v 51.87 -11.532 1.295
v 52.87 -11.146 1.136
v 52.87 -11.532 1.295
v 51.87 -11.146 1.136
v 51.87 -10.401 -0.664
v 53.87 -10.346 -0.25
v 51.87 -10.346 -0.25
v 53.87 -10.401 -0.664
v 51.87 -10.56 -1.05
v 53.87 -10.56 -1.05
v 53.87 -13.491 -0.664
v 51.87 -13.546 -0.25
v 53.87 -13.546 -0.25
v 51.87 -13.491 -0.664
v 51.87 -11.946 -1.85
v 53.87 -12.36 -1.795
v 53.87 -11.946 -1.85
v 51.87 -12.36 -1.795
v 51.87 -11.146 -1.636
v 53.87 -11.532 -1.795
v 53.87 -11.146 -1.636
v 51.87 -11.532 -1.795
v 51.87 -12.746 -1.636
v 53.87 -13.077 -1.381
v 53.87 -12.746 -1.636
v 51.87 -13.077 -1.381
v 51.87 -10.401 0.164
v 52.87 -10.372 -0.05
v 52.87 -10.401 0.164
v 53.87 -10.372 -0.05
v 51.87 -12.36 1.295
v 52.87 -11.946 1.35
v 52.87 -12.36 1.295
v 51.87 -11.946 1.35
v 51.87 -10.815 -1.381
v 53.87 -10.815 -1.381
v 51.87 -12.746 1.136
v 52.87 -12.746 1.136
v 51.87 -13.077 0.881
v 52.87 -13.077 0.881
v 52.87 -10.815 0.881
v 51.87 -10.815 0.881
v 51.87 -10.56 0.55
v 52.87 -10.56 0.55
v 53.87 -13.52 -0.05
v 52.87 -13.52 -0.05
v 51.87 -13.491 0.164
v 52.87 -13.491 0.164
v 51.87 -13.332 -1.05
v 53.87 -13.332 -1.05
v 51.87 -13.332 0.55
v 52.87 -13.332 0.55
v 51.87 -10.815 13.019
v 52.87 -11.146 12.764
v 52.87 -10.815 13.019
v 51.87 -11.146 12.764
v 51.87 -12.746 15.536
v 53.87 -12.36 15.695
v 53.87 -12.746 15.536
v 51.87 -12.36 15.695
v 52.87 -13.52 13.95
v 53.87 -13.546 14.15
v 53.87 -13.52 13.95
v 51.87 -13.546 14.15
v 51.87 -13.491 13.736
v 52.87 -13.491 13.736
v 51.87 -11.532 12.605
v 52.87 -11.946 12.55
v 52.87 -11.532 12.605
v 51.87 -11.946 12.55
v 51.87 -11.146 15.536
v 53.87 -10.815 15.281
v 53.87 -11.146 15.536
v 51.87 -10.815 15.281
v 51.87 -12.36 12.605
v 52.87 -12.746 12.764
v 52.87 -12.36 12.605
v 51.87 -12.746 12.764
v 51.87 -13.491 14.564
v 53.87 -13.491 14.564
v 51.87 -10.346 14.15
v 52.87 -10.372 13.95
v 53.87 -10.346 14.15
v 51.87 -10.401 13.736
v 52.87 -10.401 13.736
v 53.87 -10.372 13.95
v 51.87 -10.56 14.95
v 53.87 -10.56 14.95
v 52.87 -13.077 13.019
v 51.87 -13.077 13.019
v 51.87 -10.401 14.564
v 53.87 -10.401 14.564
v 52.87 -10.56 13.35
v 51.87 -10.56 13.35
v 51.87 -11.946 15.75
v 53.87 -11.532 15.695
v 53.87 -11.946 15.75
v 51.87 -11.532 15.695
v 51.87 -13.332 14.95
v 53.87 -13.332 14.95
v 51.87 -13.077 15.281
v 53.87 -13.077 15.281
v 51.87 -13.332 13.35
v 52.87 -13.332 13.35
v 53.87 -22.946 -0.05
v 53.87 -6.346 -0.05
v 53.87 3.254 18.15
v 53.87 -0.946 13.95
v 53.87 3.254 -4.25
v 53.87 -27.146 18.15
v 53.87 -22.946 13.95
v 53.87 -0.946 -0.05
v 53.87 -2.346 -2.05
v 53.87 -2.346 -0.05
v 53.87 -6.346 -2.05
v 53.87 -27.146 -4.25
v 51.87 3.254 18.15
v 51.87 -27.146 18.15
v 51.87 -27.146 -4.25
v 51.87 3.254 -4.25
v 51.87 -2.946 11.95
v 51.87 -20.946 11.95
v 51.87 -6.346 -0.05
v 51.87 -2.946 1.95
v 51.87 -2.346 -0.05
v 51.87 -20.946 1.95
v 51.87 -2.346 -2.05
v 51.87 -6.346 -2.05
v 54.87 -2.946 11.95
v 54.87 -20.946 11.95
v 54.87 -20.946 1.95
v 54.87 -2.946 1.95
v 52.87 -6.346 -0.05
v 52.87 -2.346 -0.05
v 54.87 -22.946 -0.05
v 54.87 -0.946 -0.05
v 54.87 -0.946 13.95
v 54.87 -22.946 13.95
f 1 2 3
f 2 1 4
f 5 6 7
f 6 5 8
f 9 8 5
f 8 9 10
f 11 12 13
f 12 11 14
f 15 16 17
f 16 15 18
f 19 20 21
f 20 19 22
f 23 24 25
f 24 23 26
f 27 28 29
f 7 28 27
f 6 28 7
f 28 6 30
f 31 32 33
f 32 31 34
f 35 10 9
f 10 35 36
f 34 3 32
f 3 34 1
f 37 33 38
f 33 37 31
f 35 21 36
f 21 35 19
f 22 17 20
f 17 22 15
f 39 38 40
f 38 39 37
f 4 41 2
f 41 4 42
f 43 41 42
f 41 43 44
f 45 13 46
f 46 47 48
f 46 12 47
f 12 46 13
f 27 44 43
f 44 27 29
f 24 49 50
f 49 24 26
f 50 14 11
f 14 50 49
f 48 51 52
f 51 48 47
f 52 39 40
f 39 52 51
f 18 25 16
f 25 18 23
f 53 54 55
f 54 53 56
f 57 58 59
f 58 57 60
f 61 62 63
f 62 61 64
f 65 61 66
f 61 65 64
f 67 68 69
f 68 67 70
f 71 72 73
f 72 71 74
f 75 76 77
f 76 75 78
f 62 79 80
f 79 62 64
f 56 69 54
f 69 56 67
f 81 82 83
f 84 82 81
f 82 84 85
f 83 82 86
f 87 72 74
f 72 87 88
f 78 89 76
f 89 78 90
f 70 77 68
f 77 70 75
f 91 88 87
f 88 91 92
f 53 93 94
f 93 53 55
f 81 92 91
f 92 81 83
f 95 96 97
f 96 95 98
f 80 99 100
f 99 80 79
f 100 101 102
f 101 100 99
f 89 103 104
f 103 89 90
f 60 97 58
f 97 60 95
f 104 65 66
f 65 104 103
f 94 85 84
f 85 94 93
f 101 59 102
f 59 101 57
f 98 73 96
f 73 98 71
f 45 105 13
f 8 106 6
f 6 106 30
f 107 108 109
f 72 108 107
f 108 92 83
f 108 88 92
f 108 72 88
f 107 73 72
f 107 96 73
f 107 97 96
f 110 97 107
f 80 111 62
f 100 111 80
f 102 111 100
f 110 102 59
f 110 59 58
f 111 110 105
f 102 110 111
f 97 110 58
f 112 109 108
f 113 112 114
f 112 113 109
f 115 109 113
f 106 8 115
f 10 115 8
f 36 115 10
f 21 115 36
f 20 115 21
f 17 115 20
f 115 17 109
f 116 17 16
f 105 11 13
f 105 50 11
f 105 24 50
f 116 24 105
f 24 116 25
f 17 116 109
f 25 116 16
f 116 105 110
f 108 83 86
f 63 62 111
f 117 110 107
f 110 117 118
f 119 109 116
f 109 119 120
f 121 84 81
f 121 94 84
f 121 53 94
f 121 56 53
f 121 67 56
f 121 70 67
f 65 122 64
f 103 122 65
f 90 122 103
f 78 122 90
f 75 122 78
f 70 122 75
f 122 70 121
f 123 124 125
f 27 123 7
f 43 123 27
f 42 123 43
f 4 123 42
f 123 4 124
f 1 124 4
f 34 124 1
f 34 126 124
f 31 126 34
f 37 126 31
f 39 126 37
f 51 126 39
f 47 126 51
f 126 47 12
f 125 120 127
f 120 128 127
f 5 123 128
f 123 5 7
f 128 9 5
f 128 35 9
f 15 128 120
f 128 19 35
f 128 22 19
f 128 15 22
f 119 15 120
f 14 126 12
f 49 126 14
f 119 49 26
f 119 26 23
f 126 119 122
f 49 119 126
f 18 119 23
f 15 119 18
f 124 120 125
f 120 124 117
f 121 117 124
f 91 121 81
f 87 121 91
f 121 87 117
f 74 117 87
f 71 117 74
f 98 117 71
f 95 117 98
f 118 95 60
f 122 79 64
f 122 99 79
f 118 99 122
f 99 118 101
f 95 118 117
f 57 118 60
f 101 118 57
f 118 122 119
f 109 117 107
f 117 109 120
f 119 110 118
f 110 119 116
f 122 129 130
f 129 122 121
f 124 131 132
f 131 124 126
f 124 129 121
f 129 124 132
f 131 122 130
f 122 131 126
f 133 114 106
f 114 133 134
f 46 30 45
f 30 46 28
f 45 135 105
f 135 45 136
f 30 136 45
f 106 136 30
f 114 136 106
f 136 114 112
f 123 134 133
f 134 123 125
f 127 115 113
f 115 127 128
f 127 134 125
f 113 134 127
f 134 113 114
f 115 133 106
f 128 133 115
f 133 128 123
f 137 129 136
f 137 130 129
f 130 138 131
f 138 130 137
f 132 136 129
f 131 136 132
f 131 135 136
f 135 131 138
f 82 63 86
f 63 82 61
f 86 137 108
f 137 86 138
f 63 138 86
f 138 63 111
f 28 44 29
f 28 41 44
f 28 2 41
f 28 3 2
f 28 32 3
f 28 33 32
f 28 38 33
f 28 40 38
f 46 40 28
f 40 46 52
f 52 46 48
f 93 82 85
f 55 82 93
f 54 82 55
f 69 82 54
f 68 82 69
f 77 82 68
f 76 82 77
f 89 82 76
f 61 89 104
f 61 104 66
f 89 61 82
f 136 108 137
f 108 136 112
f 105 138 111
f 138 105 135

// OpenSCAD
// terminal_bracket.scad — Internal terminal mounting bracket (new part)
//
// Designed from scratch. Mounts behind the terminal wall cutout to
// hold the Euroblock receptacle in place with strain relief.
//
// Features:
// - 2 mm thick mounting plate
// - Two M3 through-holes for heat-set inserts
// - 2 mm internal dust lip around cutout perimeter
// - Zip-tie slot for harness strain relief

include <config.scad>

// Bracket dimensions derived from terminal cutout
bracket_width  = terminal_cutout_w + 2 * bracket_dust_lip + 8.0;  // total width with mounting ears
bracket_height = terminal_cutout_h + 2 * bracket_dust_lip + 8.0;  // total height with mounting ears

// Terminal opening in bracket (matches Euroblock receptacle)
bracket_opening_w = 18.0;  // Euroblock receptacle width
bracket_opening_h = 10.0;  // Euroblock receptacle height

module bracket_plate() {
    // Main mounting plate
    difference() {
        // Plate body
        cube([bracket_thickness, bracket_width, bracket_height], center=true);

        // Terminal opening
        cube([bracket_thickness + 1, bracket_opening_w, bracket_opening_h], center=true);

        // M3 mounting holes (one above, one below the terminal)
        for (dz = [-bracket_height / 2 + 4, bracket_height / 2 - 4]) {
            translate([0, 0, dz])
                rotate([0, 90, 0])
                    cylinder(d=bracket_m3_hole_d, h=bracket_thickness + 1, center=true, $fn=24);
        }

        // Zip-tie slot (below the terminal opening, offset to one side)
        translate([0, bracket_width / 4, -bracket_opening_h / 2 - bracket_dust_lip - 1])
            cube([bracket_thickness + 1, bracket_zip_slot_w, bracket_zip_slot_h], center=true);
    }
}

module dust_lip() {
    // Internal dust lip — a raised border around the terminal opening
    // on the inside face. Prevents dust ingress around the connector.
    lip_outer_w = bracket_opening_w + 2 * bracket_dust_lip;
    lip_outer_h = bracket_opening_h + 2 * bracket_dust_lip;

    translate([bracket_thickness / 2, 0, 0])
        difference() {
            // Lip body
            cube([bracket_dust_lip, lip_outer_w, lip_outer_h], center=true);
            // Opening through lip
            cube([bracket_dust_lip + 1, bracket_opening_w, bracket_opening_h], center=true);
        }
}

module terminal_bracket() {
    color(color_bracket) {
        union() {
            bracket_plate();
            dust_lip();
        }
    }
}

module terminal_bracket_in_case() {
    // Bracket positioned behind the terminal wall cutout on the right wall.
    // The bracket's front face sits against the inside of the wall.
    translate([
        cutout_wall_x - wall_thickness - bracket_thickness / 2,
        terminal_case_y,
        terminal_case_z
    ])
        terminal_bracket();
}

// When rendered directly, show the bracket in case position
terminal_bracket_in_case();
